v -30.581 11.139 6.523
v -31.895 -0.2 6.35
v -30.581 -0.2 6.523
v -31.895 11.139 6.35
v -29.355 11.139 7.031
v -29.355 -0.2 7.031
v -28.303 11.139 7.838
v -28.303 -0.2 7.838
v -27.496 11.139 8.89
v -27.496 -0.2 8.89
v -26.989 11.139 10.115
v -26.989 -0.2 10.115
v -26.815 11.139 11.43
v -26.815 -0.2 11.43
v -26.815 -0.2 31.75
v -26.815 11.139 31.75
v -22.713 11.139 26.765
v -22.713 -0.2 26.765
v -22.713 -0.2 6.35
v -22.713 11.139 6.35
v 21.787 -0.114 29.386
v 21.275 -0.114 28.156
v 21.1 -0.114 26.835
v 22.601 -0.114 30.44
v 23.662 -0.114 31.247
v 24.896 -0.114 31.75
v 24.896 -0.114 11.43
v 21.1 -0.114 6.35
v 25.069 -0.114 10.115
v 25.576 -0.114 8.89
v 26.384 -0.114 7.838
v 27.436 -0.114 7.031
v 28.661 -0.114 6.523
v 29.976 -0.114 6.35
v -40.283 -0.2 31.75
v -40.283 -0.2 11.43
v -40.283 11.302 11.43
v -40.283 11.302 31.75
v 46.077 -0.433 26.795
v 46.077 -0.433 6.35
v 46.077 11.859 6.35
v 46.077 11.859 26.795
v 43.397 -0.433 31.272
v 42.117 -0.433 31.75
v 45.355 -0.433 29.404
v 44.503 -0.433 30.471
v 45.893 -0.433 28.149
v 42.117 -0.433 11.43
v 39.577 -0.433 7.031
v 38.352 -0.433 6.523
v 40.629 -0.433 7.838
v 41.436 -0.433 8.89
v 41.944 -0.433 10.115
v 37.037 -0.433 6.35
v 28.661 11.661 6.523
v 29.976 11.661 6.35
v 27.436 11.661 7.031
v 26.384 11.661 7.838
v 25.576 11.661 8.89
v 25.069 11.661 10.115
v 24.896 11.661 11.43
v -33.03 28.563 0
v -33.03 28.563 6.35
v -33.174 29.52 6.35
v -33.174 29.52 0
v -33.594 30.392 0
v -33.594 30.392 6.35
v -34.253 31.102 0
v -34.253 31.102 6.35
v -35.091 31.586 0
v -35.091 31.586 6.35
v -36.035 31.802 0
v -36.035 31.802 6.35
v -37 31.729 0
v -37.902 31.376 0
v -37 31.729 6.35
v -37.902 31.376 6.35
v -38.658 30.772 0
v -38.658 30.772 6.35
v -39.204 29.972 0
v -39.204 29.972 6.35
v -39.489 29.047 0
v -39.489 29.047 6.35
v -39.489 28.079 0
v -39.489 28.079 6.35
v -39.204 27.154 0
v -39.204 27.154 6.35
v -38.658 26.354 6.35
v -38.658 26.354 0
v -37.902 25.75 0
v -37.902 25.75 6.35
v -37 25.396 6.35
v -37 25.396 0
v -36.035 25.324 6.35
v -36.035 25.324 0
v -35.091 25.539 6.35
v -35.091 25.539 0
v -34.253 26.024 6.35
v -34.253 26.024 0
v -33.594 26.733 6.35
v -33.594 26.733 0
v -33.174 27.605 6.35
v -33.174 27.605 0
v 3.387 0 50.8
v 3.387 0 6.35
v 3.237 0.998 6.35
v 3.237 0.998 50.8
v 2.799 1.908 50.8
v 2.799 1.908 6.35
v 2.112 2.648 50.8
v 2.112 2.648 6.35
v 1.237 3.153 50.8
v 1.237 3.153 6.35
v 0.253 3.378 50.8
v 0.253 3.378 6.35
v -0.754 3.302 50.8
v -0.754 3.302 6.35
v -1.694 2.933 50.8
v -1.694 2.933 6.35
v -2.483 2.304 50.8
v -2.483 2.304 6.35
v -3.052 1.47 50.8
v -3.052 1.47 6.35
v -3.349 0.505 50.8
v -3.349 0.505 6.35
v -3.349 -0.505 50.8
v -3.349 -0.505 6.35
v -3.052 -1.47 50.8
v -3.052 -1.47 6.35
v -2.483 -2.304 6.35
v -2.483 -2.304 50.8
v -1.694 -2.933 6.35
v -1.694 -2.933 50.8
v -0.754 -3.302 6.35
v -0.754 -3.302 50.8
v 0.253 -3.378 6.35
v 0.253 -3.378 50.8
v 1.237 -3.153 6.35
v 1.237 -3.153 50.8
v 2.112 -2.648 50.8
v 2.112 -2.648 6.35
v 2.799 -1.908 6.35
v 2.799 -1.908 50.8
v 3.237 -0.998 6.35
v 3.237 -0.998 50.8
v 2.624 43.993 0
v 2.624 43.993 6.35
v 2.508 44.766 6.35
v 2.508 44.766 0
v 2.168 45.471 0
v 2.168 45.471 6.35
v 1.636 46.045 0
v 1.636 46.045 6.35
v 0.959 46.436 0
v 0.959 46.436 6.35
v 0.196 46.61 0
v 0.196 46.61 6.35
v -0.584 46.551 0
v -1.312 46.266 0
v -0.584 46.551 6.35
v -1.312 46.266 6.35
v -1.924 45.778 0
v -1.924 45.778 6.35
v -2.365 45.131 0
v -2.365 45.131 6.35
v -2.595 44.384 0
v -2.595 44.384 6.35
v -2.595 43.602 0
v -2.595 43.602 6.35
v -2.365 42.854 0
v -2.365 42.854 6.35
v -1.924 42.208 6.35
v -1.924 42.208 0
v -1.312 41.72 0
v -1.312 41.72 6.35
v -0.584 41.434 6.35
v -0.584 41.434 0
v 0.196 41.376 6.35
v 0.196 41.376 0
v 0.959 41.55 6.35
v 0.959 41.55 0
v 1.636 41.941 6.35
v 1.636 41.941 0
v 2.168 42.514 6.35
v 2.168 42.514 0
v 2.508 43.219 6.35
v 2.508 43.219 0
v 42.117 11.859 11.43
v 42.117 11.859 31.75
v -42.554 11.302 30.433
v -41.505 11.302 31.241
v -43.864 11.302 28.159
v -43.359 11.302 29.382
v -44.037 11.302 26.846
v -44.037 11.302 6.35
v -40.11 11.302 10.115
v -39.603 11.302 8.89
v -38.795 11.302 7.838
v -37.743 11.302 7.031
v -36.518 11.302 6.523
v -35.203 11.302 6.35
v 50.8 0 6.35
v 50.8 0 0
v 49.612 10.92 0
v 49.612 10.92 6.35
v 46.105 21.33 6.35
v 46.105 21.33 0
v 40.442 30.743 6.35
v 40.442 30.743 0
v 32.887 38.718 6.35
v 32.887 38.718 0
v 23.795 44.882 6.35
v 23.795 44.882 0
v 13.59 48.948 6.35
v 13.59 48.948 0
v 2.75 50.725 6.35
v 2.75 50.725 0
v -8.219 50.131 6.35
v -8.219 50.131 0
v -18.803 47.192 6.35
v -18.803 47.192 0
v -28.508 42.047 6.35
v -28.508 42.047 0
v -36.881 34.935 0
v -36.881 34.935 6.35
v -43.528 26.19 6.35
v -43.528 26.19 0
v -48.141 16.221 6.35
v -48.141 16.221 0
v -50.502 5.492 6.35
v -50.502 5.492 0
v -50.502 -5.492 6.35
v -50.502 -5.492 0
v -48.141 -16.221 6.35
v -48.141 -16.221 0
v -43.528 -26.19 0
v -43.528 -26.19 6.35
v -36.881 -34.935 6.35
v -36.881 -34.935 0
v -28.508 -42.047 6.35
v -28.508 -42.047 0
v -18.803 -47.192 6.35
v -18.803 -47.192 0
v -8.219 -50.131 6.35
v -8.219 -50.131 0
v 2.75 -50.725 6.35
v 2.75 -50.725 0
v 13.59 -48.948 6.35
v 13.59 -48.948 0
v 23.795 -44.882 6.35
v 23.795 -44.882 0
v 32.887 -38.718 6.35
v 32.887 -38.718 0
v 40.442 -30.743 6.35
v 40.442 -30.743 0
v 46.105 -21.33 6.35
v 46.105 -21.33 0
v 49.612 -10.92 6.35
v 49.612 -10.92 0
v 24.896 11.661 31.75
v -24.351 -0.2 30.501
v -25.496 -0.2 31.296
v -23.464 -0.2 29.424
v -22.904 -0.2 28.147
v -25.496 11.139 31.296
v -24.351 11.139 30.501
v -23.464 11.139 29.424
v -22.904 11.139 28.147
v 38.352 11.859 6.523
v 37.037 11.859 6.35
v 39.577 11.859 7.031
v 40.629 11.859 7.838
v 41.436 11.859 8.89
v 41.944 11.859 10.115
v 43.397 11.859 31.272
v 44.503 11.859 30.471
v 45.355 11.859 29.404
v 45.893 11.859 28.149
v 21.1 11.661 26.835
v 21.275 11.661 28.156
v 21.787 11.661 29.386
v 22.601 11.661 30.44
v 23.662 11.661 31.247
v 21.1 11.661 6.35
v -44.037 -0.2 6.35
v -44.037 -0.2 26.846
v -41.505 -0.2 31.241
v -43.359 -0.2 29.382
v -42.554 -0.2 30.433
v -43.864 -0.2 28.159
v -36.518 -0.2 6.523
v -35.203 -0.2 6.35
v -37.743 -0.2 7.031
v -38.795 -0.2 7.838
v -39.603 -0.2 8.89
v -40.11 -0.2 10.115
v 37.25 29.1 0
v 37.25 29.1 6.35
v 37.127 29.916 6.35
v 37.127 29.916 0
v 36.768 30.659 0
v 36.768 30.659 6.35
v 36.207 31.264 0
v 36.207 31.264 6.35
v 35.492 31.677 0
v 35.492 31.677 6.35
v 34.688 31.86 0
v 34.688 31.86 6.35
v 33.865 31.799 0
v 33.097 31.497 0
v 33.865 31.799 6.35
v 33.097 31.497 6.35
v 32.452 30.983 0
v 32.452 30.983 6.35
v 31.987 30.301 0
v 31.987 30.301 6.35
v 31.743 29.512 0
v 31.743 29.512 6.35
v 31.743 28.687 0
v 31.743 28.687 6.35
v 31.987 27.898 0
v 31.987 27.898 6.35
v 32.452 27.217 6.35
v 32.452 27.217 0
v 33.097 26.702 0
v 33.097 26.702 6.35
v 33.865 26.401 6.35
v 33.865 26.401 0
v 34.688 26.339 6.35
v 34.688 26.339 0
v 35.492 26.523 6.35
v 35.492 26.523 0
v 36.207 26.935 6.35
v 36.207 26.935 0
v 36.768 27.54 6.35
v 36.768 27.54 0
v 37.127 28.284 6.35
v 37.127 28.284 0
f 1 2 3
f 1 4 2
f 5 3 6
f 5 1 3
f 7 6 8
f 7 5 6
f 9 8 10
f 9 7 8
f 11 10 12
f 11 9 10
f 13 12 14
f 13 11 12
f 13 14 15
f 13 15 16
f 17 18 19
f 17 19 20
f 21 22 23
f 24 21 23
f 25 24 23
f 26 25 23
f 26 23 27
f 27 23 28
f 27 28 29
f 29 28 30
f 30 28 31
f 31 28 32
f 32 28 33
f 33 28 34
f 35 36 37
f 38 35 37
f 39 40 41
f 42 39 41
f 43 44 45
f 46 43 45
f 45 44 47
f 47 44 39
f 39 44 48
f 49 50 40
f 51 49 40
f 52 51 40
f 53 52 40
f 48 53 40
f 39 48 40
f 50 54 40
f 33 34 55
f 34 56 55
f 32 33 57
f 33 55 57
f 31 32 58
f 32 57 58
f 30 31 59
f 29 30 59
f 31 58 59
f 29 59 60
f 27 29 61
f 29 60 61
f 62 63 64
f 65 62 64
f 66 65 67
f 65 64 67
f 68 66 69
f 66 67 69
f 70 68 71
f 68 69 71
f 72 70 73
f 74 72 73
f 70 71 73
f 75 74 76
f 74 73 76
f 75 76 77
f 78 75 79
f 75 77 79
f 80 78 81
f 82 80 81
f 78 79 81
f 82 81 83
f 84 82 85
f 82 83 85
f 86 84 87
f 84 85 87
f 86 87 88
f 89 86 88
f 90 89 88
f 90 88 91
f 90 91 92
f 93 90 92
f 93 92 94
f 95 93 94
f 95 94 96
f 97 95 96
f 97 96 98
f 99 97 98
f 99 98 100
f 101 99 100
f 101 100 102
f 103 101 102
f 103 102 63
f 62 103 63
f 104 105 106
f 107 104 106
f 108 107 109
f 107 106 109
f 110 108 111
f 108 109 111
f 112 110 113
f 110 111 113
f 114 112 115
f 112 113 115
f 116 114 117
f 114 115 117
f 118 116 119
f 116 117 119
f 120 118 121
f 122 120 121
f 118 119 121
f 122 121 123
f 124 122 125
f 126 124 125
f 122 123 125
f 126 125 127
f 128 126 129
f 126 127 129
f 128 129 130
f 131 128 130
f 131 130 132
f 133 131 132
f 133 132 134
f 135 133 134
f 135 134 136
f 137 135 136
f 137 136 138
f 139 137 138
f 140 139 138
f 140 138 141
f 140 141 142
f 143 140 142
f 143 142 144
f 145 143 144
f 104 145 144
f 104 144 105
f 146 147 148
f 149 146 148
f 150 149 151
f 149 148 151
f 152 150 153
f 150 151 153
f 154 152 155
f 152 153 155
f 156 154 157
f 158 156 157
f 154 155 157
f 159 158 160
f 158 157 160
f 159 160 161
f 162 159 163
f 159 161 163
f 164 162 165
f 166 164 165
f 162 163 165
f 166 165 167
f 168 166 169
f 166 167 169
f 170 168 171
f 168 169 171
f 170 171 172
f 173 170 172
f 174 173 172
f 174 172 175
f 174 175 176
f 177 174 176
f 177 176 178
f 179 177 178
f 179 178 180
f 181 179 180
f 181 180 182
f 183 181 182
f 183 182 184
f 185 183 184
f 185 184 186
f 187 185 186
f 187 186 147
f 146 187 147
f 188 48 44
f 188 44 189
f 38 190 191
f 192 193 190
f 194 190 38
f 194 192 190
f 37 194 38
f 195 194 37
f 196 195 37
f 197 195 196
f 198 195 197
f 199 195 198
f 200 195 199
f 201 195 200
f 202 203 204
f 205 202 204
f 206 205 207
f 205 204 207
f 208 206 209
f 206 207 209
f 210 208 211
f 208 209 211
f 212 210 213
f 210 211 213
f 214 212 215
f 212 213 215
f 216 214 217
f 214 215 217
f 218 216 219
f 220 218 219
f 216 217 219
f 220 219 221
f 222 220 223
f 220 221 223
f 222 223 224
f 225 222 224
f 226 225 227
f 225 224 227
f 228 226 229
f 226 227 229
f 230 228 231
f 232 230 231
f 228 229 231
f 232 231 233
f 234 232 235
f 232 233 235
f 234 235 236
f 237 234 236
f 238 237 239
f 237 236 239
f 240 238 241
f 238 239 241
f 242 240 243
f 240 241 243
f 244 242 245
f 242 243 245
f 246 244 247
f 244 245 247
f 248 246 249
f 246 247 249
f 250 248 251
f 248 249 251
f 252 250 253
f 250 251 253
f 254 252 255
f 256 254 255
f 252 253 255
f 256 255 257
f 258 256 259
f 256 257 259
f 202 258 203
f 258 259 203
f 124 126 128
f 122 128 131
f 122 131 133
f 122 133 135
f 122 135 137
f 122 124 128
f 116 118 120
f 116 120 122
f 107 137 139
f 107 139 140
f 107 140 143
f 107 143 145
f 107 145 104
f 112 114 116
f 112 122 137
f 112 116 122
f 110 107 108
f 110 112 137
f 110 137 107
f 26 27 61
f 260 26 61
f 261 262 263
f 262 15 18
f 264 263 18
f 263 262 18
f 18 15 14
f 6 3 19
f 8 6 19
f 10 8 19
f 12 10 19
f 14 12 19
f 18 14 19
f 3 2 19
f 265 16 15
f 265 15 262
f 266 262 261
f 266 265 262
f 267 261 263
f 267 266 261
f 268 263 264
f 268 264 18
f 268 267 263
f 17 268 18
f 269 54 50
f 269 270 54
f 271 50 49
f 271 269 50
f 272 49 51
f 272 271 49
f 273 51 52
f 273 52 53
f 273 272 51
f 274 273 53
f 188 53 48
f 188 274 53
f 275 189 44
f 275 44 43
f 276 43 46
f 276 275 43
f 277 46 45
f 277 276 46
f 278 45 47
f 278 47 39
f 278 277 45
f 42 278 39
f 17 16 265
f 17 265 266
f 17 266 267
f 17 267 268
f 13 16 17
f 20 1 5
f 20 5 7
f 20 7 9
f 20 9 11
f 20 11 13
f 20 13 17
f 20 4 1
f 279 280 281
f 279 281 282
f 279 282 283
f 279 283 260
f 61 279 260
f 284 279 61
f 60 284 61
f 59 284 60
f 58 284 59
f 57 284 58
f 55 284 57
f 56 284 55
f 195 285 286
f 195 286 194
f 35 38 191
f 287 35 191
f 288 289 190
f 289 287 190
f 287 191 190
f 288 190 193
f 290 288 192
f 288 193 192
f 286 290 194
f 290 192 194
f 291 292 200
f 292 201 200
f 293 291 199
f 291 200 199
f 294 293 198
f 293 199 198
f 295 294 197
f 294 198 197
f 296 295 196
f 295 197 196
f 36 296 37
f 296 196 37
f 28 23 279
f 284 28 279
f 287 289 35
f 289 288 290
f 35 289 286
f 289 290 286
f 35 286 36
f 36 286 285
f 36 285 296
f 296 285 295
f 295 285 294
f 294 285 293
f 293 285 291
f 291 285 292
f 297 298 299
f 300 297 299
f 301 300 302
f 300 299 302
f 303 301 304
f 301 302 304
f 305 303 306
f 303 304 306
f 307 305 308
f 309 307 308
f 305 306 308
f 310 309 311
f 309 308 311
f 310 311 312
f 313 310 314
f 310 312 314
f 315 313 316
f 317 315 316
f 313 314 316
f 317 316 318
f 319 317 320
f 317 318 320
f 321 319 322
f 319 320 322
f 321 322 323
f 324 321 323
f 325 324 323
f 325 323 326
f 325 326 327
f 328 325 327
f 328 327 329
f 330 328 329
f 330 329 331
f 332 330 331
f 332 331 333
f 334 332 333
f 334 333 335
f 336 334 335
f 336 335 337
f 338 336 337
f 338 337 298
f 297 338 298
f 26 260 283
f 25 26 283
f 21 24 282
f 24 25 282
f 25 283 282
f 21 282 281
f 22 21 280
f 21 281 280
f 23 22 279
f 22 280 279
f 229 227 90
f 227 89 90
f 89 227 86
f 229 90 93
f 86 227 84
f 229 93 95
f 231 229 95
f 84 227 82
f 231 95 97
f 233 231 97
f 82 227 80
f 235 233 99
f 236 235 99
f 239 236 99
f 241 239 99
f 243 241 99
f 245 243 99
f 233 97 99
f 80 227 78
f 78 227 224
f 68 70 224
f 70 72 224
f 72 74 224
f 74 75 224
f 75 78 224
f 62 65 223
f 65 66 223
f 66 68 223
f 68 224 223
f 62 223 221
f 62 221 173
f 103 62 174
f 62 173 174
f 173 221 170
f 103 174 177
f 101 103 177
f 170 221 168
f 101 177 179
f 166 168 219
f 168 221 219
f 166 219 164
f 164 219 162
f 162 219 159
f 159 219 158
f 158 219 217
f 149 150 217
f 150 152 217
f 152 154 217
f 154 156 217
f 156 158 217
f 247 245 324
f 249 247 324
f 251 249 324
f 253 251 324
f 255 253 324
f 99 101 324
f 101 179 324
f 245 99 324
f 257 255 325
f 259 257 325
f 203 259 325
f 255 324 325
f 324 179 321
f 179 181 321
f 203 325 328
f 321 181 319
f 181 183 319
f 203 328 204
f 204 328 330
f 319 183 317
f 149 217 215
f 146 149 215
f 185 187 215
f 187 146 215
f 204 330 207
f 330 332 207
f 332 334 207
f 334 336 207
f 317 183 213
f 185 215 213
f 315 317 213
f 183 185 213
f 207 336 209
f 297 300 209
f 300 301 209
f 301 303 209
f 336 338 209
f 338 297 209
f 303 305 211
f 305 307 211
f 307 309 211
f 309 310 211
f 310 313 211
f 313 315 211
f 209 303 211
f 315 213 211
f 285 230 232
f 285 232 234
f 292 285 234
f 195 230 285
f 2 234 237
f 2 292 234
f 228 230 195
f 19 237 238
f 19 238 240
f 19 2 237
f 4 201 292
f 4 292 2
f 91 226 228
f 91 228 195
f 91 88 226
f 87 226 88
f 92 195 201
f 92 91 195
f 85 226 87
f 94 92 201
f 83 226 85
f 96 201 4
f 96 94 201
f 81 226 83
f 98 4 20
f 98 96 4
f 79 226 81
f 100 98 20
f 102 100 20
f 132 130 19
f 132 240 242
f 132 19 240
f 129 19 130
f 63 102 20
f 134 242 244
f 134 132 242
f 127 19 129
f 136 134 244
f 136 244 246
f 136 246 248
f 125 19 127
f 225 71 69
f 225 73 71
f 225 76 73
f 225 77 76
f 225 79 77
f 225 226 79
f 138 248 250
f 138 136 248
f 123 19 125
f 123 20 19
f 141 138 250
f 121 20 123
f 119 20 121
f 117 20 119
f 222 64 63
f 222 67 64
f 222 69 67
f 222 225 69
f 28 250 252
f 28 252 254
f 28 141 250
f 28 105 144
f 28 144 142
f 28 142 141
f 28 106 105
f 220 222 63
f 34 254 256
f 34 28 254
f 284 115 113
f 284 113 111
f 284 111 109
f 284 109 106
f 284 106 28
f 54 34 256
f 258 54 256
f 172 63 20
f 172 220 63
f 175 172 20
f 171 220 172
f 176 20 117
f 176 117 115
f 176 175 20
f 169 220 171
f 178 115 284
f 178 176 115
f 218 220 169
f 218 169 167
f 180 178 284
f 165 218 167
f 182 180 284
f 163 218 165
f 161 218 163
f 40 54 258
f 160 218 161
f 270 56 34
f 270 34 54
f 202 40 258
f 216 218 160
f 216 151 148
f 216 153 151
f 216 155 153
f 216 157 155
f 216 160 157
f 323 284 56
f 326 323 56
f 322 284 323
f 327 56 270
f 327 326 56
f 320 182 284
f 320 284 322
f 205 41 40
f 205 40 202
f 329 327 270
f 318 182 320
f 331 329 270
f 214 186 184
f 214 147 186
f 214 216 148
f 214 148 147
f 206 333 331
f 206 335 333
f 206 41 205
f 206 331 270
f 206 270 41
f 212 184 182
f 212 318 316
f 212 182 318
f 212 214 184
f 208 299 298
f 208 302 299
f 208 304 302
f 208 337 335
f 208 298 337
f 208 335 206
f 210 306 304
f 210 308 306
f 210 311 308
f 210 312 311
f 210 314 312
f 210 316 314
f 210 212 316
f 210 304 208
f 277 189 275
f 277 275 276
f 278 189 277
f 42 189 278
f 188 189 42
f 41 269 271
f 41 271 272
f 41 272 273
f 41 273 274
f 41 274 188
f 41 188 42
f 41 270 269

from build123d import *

# Parameters (mm, degrees)
F0_R        = 50.8
F1_DEPTH    = 6.35
F2_R        = 3.3872020891
F3_DEPTH    = 50.8
F4_W        = 3.7956816162
F4_H        = 11.7751168936
F4_W_2      = 3.9597040755
F4_H_2      = 12.2920670431
F4_W_3      = 3.7532411516
F4_H_3      = 11.5020200028
F4_W_4      = 4.1028857231
F4_H_4      = 11.3390376209
F5_DEPTH    = 17.78
F6_R        = 5.08
F7_DEPTH    = 25.4
F8_T1_DEPTH = 36.0204370388
F8_T3_DEPTH = 36.2647510961
F8_T5_DEPTH = 36.3499649547
F8_T7_DEPTH = 37.0667199375
F9_R        = 2.6244366773
F9_R_2      = 2.7684987857
F9_R_3      = 3.2478511369
F10_DEPTH   = 25.4


# Not quite as in the source:
# - a fillet or chamfer that OpenCascade refuses, or shapes differently, is made with other operations: its cross-section is extruded or revolved along the edge and cut away or added


with BuildPart() as f1:
    # F0 (on Top) → F1 (new body)
    with BuildSketch(Plane.XY):
        Circle(F0_R)
    extrude(amount=F1_DEPTH)

    # F2 (on Top) → F3 (join)
    with BuildSketch(Plane.XY):
        Circle(F2_R)
    extrude(amount=F3_DEPTH)

    # F4 (on face) → F5 (join)
    with BuildSketch(Plane.XY.offset(6.35)):
        with Locations((22.9978772923, 5.7736401254)):
            Rectangle(F4_W, F4_H)
        with Locations((44.0967701382, 5.7131922383)):
            Rectangle(F4_W_2, F4_H_2)
        with Locations((-42.1600081027, 5.5507384532)):
            Rectangle(F4_W_3, F4_H_3)
        with Locations((-24.7639858169, 5.4692472622)):
            Rectangle(F4_W_4, F4_H_4)
    extrude(amount=F5_DEPTH)

    # F6
    f6_edges = [f1.edges().sort_by_distance(p)[0] for p in [
        (24.895718, 5.77364, 6.35),
        (42.116918, 5.713192, 6.35),
        (-40.283388, 5.550738, 6.35),
        (-26.815429, 5.469247, 6.35),
    ]]
    fillet(f6_edges, radius=F6_R)

    # F4 (on face) → F7 (join)
    with BuildSketch(Plane.XY.offset(6.35)):
        with Locations((22.9978772923, 5.7736401254)):
            Rectangle(F4_W, F4_H)
        with Locations((44.0967701382, 5.7131922383)):
            Rectangle(F4_W_2, F4_H_2)
        with Locations((-42.1600081027, 5.5507384532)):
            Rectangle(F4_W_3, F4_H_3)
        with Locations((-24.7639858169, 5.4692472622)):
            Rectangle(F4_W_4, F4_H_4)
    extrude(amount=F7_DEPTH)

    # F8: fillet of radius 5.08 on 4 edges, made by hand

    # F8_s2 → F8_t1 (cut)
    with BuildSketch(Plane.XZ.offset(-23.5609569726)):
        with BuildLine():
            ThreePointArc((-40.2833875269, 31.75), (-42.9906301007, 29.9339099153), (-44.0366286784, 26.8463165928))
            Line((-44.0366286784, 26.8463165928), (-44.0366286784, 31.75))
            Line((-44.0366286784, 31.75), (-40.2833875269, 31.75))
        make_face()
    extrude(amount=F8_T1_DEPTH, mode=Mode.SUBTRACT)

    # F8_s4 → F8_t3 (cut)
    with BuildSketch(Plane.XZ.offset(-23.6016228103)):
        with BuildLine():
            ThreePointArc((-26.8154286784, 31.75), (-23.8701622671, 29.9930657457), (-22.7125429553, 26.764857305))
            Line((-22.7125429553, 26.764857305), (-22.7125429553, 31.75))
            Line((-22.7125429553, 31.75), (-26.8154286784, 31.75))
        make_face()
    extrude(amount=F8_T3_DEPTH, mode=Mode.SUBTRACT)

    # F8_s6 → F8_t5 (cut)
    with BuildSketch(Plane.XZ.offset(-23.9486226027)):
        with BuildLine():
            ThreePointArc((24.8957181004, 31.75), (22.1594185349, 29.9400314031), (21.1000364843, 26.8350303878))
            Line((21.1000364843, 26.8350303878), (21.1000364843, 31.75))
            Line((21.1000364843, 31.75), (24.8957181004, 31.75))
        make_face()
    extrude(amount=F8_T5_DEPTH, mode=Mode.SUBTRACT)

    # F8_s8 → F8_t7 (cut)
    with BuildSketch(Plane.XZ.offset(-24.2465522071)):
        with BuildLine():
            ThreePointArc((42.1169181004, 31.75), (44.9650918619, 29.9664489871), (46.0766221759, 26.7950694211))
            Line((46.0766221759, 26.7950694211), (46.0766221759, 31.75))
            Line((46.0766221759, 31.75), (42.1169181004, 31.75))
        make_face()
    extrude(amount=F8_T7_DEPTH, mode=Mode.SUBTRACT)

    # F9 (on face) → F10 (cut)
    with BuildSketch(Plane.XY.offset(6.35)):
        with Locations((0, 43.9927652478)):
            Circle(F9_R)
        with Locations((34.4810411334, 29.0996860713)):
            Circle(F9_R_2)
        with Locations((-36.2776443362, 28.5628065467)):
            Circle(F9_R_3)
    extrude(amount=-F10_DEPTH, mode=Mode.SUBTRACT)


solid = f1.part
